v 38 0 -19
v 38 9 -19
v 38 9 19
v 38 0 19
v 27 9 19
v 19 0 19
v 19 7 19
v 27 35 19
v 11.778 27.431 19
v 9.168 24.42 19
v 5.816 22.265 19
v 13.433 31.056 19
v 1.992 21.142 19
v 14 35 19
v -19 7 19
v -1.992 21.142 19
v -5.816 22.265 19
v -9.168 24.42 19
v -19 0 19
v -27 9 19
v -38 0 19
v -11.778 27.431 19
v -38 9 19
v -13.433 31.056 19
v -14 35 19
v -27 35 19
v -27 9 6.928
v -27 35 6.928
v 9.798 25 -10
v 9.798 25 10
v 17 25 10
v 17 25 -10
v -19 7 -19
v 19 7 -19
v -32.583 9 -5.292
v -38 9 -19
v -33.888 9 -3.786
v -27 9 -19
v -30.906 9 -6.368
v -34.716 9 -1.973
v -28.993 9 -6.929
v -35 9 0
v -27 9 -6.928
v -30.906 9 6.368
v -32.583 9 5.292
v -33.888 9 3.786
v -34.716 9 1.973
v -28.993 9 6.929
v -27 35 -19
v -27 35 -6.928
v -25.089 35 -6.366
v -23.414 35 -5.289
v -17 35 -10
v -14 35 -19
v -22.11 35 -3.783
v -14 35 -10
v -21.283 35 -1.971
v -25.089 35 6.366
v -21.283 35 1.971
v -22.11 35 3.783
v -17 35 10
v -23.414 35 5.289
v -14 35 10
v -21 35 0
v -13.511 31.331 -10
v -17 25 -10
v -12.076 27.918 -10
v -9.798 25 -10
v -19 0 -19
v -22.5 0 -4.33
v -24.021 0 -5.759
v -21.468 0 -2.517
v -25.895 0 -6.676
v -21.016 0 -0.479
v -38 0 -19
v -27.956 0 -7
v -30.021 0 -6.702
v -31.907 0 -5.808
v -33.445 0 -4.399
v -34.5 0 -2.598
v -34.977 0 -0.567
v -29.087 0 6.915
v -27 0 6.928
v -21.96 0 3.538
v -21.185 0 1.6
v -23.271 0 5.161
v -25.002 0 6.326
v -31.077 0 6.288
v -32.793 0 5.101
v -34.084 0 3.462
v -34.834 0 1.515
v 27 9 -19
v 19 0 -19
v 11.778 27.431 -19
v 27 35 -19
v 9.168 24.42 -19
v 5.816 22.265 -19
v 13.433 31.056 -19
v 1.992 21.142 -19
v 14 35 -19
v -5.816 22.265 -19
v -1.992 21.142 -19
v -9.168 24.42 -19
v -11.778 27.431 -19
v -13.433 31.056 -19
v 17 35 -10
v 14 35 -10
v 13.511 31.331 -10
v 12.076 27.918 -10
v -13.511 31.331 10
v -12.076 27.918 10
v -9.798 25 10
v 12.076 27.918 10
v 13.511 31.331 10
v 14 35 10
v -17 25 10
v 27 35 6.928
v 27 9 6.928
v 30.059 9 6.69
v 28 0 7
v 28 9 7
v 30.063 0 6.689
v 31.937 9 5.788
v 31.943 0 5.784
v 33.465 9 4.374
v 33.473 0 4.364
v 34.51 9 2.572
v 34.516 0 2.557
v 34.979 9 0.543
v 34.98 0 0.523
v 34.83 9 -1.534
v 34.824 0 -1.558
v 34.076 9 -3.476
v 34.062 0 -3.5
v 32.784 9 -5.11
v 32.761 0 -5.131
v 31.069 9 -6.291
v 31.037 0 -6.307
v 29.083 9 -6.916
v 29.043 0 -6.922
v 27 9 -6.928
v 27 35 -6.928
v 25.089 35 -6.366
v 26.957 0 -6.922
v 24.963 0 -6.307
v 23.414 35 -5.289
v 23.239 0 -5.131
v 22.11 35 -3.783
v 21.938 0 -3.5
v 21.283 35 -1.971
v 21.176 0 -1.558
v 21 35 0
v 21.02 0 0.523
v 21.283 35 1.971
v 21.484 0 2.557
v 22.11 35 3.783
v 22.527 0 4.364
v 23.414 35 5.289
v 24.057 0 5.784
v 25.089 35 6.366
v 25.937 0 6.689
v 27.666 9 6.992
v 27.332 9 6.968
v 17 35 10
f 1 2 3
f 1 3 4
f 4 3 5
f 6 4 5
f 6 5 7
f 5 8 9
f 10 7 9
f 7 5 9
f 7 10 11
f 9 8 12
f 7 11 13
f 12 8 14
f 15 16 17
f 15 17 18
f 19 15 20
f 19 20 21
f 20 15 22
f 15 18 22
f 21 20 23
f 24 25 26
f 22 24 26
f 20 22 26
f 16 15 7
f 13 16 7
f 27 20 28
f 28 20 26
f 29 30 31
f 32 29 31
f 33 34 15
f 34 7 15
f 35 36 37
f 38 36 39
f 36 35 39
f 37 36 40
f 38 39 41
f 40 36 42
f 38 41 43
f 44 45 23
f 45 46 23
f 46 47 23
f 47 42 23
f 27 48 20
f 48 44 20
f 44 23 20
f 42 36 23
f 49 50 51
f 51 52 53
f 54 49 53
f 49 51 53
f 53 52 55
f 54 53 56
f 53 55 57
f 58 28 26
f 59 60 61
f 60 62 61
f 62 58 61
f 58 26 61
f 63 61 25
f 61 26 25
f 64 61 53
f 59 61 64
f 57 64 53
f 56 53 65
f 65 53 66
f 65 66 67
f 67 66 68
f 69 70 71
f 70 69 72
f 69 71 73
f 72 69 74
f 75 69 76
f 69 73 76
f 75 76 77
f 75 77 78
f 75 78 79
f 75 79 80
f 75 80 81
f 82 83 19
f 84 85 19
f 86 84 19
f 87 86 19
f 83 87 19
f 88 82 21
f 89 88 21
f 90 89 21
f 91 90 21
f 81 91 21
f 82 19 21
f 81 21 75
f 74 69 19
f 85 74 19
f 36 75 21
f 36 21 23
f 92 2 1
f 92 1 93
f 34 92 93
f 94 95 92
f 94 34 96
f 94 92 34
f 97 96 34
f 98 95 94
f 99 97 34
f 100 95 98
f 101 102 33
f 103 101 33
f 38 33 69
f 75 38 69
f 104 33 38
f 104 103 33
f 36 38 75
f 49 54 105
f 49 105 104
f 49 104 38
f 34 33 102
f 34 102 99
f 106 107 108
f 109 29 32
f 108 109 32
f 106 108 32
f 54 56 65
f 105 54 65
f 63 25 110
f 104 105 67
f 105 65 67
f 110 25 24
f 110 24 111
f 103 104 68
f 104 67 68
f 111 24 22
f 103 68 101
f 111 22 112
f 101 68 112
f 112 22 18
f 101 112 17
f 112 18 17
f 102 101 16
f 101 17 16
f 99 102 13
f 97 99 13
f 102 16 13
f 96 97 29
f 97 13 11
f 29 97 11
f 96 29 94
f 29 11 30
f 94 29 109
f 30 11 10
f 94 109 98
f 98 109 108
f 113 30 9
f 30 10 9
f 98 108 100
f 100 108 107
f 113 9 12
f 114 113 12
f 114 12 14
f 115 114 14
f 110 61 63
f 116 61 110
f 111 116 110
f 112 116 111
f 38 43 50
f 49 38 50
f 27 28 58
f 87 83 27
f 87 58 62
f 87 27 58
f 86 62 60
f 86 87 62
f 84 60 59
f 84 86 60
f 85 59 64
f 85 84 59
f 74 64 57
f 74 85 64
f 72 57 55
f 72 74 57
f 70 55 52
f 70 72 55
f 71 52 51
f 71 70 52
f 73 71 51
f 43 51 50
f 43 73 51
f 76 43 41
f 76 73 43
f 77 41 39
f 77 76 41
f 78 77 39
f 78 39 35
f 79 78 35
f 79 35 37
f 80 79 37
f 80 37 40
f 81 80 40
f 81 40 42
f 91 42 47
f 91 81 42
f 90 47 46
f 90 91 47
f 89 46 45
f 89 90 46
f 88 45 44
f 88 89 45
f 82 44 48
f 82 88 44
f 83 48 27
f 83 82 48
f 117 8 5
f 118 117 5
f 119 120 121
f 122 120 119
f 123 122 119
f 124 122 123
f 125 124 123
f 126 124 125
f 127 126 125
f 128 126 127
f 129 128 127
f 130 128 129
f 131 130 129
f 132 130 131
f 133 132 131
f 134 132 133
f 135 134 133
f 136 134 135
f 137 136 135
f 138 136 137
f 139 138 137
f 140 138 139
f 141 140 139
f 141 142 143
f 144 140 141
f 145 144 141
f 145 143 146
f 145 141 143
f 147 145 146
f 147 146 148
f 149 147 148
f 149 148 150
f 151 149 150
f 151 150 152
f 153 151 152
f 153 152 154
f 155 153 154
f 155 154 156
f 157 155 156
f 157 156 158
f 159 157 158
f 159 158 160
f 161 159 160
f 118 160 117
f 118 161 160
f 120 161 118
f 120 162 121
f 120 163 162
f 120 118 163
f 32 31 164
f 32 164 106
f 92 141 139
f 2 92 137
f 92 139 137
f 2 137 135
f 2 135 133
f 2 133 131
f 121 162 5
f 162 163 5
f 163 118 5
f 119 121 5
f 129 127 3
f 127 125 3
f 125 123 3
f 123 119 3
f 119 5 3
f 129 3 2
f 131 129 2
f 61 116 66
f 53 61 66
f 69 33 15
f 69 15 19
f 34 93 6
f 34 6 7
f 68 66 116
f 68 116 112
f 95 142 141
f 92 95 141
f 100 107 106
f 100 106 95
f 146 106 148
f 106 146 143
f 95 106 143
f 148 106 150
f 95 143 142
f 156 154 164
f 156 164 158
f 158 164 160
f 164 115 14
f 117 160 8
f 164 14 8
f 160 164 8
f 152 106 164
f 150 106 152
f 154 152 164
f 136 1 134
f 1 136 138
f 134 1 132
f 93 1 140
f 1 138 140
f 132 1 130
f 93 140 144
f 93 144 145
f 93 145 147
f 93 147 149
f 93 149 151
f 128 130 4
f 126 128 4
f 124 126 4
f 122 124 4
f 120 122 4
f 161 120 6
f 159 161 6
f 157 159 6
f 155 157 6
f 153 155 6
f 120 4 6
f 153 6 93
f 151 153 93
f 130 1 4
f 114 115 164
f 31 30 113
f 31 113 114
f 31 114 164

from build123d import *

# Parameters (mm, degrees)
EXTRUDE_1_DEPTH          = 19
CUT_EXTRUDE_1_DEPTH      = 50.809637622
CUT_EXTRUDE_1_DEPTH_BACK = 50.809637622
SKETCH_2_R               = 7
CUT_EXTRUDE_2_DEPTH      = 56.045435778
CUT_EXTRUDE_2_DEPTH_BACK = 10
SKETCH_3_W               = 34
SKETCH_3_H               = 20


with BuildPart() as part:
    # 草图1 → 凸台-拉伸1 (new, symmetric)
    with BuildSketch(Plane.XY):
        with BuildLine():
            ThreePointArc((-14, 35), (0, 21), (14, 35))
            Line((14, 35), (27, 35))
            Line((27, 35), (27, 9))
            Line((27, 9), (38, 9))
            Line((38, 9), (38, 0))
            Line((38, 0), (19, 0))
            Line((19, 0), (19, 7))
            Line((19, 7), (-19, 7))
            Line((-19, 7), (-19, 0))
            Line((-19, 0), (-38, 0))
            Line((-38, 0), (-38, 9))
            Line((-38, 9), (-27, 9))
            Line((-27, 9), (-27, 35))
            Line((-27, 35), (-14, 35))
        make_face()
    extrude(amount=EXTRUDE_1_DEPTH, both=True)

    # 草图2 → 切除-拉伸1 (cut, two sides: drawn at the far end of the back side and taken through both)
    with BuildSketch(Plane(origin=(0, 9, 0), x_dir=(1, 0, 0), z_dir=(0, 1, 0)).offset(-CUT_EXTRUDE_1_DEPTH_BACK)):
        with Locations(Location((28, 0, 0), (0, 0, 270))):
            Circle(SKETCH_2_R)
        with Locations(Location((-28, 0, 0), (0, 0, 278.213210702))):
            Circle(SKETCH_2_R)
    extrude(amount=CUT_EXTRUDE_1_DEPTH + CUT_EXTRUDE_1_DEPTH_BACK, mode=Mode.SUBTRACT)

    # 草图3 → 切除-拉伸2 (cut, two sides: drawn at the far end of the back side and taken through both)
    with BuildSketch(Plane(origin=(0, 35, 0), x_dir=(1, 0, 0), z_dir=(0, 1, 0)).offset(-CUT_EXTRUDE_2_DEPTH_BACK)):
        Rectangle(SKETCH_3_W, SKETCH_3_H)
    extrude(amount=CUT_EXTRUDE_2_DEPTH + CUT_EXTRUDE_2_DEPTH_BACK, mode=Mode.SUBTRACT)


solid = part.part
